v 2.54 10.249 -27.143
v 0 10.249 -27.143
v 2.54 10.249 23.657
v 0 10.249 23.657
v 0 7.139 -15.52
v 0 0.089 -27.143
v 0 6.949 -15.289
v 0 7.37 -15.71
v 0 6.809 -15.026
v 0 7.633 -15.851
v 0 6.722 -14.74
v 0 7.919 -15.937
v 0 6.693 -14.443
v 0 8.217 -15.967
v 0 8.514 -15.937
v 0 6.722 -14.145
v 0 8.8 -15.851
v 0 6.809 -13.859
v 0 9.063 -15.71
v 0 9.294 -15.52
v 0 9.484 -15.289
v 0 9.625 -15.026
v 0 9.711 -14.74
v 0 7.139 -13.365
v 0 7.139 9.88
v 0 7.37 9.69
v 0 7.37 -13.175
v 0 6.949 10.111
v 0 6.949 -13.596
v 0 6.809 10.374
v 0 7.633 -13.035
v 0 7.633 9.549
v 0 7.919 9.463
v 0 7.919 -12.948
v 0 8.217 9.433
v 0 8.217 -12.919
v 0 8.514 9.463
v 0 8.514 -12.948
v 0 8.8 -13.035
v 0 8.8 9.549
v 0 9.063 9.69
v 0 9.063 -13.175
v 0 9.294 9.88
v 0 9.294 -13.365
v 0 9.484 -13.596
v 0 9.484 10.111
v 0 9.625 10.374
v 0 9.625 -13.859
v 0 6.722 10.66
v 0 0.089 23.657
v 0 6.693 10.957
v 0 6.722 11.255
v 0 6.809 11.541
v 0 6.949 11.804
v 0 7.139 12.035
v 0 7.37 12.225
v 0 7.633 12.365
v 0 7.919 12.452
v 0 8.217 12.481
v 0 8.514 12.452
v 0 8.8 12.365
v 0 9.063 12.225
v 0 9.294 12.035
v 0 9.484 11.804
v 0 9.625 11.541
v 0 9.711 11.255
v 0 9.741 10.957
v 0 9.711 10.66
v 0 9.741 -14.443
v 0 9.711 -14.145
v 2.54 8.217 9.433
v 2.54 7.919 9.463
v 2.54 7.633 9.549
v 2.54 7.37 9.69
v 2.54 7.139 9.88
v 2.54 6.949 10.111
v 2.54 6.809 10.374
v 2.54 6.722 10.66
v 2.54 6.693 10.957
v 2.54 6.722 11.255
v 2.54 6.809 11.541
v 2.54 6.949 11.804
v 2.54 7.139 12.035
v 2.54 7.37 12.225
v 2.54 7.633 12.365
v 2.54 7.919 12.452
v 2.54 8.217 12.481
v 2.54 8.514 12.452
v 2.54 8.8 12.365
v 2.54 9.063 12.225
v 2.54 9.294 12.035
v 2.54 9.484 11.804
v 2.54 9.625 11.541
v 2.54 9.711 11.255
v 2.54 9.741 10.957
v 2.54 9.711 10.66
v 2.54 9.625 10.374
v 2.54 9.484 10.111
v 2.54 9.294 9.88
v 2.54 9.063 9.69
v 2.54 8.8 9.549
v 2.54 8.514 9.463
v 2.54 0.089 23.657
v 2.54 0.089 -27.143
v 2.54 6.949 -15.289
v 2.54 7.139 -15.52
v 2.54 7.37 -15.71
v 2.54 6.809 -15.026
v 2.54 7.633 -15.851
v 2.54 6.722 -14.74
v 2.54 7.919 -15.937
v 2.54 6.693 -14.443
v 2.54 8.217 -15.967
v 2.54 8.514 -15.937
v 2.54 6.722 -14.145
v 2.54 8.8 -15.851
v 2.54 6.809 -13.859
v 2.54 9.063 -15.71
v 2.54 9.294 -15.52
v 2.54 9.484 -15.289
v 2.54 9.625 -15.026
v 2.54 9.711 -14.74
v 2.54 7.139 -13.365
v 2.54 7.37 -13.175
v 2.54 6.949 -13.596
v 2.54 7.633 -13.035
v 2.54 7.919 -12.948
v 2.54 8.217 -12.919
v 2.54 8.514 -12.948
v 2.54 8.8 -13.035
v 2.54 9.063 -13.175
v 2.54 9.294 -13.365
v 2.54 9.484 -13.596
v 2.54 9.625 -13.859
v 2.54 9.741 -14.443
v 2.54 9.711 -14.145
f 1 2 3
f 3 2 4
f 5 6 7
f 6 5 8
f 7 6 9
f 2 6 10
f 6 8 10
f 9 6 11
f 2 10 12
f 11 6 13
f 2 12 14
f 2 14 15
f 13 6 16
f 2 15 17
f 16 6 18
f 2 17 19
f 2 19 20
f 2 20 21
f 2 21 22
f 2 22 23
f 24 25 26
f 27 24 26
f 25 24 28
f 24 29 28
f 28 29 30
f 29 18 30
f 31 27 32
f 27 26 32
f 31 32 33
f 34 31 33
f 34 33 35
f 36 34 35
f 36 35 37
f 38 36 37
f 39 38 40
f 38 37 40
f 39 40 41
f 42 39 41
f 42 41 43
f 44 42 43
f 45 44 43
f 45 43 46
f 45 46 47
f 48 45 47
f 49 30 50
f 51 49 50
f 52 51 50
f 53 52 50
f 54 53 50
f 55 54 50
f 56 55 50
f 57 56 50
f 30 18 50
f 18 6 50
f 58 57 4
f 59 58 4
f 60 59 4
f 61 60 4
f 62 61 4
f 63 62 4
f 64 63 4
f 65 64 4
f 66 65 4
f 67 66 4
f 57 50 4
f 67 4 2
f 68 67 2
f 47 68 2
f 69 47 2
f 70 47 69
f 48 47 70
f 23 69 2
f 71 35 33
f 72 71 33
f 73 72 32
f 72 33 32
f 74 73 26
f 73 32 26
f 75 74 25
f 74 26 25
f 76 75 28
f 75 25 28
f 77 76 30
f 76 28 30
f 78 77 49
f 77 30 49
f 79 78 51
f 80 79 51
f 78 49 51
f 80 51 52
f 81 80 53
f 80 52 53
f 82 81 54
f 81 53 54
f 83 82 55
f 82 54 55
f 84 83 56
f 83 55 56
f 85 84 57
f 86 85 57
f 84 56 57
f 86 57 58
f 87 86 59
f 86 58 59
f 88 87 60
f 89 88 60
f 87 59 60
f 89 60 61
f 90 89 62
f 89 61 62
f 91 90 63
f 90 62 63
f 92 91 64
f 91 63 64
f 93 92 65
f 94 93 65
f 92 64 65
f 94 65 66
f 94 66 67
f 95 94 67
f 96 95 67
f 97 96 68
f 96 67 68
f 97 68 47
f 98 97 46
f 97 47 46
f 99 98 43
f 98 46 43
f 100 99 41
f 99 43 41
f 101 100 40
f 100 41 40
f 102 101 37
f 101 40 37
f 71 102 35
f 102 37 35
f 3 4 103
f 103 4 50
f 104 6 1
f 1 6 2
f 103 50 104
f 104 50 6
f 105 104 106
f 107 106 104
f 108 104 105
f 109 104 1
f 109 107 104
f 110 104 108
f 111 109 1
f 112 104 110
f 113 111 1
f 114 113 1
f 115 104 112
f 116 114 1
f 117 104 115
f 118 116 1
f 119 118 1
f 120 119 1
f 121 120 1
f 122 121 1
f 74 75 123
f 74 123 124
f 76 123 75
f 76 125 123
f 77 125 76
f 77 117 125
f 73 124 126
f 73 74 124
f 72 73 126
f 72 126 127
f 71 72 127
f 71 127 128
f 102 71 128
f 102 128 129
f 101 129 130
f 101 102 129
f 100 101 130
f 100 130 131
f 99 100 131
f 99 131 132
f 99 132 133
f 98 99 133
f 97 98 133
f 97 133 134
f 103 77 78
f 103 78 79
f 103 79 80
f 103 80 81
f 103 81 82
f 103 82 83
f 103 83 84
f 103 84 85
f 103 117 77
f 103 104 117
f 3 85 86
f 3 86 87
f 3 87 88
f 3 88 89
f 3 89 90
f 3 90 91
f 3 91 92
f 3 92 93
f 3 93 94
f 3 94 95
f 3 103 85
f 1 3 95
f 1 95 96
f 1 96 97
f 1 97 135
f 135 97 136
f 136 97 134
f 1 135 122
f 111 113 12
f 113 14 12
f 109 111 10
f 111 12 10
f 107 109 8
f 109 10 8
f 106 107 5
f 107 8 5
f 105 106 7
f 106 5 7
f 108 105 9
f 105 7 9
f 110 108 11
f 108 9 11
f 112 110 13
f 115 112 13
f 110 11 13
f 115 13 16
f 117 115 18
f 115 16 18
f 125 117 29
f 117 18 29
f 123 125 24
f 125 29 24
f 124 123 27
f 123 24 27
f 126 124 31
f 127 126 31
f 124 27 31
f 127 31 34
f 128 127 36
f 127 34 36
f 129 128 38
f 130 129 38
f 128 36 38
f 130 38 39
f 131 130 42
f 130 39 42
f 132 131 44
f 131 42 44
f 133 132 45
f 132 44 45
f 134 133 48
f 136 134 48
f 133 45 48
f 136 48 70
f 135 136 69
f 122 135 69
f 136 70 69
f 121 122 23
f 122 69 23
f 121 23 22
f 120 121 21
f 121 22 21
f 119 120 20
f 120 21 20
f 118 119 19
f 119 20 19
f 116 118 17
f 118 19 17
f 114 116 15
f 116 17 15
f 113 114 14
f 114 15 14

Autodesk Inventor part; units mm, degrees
ref_plane "YZ Plane" through (0, 0, 0) normal (1, 0, 0) x (0, 1, 0)
ref_plane "XZ Plane" through (0, 0, 0) normal (0, 1, 0) x (-1, 0, 0)
ref_plane "XY Plane" through (0, 0, 0) normal (0, 0, 1) x (1, 0, 0)
sketch "Sketch1" plane through (0, 0, 0) normal (1, 0, 0) x (0, 1, 0)
  line L0 (10.2486, 23.6574) -> (0.0886, 23.6574)
  line L1 (0.0886, 23.6574) -> (0.0886, -27.1426)
  line L2 (0.0886, -27.1426) -> (10.2486, -27.1426)
  line L3 (10.2486, -27.1426) -> (10.2486, 23.6574)
  point P0 (0, 0)
  dimension "d0" = 50.8
  dimension "d1" = 10.16
extrude "Extrusion1" add sketch "Sketch1" along normal blind 2.54
sketch "Sketch2" plane through (2.54, 0, 0) normal (1, 0, 0) x (0, 0, -1)
  line L0 (-23.6574, 0.0886) -> (27.1426, 0.0886) projected
  line L1 (-23.6574, 10.2486) -> (-23.6574, 0.0886) projected
  point P0 (0, 0)
  point P1 (-10.9574, 8.2166)
  point P2 (14.4426, 8.2166)
  dimension "d4" = 0
  dimension "d5" = 8.128
  dimension "d6" = 12.7
  dimension "d7" = 25.4
hole "Hole1" at (2.54, 8.2166, 10.9574) at (2.54, 8.2166, -14.4426) direction (-1, 0, 0) diameter 3.048 end through all
properties part number "NeoPixel 8 Stick"
